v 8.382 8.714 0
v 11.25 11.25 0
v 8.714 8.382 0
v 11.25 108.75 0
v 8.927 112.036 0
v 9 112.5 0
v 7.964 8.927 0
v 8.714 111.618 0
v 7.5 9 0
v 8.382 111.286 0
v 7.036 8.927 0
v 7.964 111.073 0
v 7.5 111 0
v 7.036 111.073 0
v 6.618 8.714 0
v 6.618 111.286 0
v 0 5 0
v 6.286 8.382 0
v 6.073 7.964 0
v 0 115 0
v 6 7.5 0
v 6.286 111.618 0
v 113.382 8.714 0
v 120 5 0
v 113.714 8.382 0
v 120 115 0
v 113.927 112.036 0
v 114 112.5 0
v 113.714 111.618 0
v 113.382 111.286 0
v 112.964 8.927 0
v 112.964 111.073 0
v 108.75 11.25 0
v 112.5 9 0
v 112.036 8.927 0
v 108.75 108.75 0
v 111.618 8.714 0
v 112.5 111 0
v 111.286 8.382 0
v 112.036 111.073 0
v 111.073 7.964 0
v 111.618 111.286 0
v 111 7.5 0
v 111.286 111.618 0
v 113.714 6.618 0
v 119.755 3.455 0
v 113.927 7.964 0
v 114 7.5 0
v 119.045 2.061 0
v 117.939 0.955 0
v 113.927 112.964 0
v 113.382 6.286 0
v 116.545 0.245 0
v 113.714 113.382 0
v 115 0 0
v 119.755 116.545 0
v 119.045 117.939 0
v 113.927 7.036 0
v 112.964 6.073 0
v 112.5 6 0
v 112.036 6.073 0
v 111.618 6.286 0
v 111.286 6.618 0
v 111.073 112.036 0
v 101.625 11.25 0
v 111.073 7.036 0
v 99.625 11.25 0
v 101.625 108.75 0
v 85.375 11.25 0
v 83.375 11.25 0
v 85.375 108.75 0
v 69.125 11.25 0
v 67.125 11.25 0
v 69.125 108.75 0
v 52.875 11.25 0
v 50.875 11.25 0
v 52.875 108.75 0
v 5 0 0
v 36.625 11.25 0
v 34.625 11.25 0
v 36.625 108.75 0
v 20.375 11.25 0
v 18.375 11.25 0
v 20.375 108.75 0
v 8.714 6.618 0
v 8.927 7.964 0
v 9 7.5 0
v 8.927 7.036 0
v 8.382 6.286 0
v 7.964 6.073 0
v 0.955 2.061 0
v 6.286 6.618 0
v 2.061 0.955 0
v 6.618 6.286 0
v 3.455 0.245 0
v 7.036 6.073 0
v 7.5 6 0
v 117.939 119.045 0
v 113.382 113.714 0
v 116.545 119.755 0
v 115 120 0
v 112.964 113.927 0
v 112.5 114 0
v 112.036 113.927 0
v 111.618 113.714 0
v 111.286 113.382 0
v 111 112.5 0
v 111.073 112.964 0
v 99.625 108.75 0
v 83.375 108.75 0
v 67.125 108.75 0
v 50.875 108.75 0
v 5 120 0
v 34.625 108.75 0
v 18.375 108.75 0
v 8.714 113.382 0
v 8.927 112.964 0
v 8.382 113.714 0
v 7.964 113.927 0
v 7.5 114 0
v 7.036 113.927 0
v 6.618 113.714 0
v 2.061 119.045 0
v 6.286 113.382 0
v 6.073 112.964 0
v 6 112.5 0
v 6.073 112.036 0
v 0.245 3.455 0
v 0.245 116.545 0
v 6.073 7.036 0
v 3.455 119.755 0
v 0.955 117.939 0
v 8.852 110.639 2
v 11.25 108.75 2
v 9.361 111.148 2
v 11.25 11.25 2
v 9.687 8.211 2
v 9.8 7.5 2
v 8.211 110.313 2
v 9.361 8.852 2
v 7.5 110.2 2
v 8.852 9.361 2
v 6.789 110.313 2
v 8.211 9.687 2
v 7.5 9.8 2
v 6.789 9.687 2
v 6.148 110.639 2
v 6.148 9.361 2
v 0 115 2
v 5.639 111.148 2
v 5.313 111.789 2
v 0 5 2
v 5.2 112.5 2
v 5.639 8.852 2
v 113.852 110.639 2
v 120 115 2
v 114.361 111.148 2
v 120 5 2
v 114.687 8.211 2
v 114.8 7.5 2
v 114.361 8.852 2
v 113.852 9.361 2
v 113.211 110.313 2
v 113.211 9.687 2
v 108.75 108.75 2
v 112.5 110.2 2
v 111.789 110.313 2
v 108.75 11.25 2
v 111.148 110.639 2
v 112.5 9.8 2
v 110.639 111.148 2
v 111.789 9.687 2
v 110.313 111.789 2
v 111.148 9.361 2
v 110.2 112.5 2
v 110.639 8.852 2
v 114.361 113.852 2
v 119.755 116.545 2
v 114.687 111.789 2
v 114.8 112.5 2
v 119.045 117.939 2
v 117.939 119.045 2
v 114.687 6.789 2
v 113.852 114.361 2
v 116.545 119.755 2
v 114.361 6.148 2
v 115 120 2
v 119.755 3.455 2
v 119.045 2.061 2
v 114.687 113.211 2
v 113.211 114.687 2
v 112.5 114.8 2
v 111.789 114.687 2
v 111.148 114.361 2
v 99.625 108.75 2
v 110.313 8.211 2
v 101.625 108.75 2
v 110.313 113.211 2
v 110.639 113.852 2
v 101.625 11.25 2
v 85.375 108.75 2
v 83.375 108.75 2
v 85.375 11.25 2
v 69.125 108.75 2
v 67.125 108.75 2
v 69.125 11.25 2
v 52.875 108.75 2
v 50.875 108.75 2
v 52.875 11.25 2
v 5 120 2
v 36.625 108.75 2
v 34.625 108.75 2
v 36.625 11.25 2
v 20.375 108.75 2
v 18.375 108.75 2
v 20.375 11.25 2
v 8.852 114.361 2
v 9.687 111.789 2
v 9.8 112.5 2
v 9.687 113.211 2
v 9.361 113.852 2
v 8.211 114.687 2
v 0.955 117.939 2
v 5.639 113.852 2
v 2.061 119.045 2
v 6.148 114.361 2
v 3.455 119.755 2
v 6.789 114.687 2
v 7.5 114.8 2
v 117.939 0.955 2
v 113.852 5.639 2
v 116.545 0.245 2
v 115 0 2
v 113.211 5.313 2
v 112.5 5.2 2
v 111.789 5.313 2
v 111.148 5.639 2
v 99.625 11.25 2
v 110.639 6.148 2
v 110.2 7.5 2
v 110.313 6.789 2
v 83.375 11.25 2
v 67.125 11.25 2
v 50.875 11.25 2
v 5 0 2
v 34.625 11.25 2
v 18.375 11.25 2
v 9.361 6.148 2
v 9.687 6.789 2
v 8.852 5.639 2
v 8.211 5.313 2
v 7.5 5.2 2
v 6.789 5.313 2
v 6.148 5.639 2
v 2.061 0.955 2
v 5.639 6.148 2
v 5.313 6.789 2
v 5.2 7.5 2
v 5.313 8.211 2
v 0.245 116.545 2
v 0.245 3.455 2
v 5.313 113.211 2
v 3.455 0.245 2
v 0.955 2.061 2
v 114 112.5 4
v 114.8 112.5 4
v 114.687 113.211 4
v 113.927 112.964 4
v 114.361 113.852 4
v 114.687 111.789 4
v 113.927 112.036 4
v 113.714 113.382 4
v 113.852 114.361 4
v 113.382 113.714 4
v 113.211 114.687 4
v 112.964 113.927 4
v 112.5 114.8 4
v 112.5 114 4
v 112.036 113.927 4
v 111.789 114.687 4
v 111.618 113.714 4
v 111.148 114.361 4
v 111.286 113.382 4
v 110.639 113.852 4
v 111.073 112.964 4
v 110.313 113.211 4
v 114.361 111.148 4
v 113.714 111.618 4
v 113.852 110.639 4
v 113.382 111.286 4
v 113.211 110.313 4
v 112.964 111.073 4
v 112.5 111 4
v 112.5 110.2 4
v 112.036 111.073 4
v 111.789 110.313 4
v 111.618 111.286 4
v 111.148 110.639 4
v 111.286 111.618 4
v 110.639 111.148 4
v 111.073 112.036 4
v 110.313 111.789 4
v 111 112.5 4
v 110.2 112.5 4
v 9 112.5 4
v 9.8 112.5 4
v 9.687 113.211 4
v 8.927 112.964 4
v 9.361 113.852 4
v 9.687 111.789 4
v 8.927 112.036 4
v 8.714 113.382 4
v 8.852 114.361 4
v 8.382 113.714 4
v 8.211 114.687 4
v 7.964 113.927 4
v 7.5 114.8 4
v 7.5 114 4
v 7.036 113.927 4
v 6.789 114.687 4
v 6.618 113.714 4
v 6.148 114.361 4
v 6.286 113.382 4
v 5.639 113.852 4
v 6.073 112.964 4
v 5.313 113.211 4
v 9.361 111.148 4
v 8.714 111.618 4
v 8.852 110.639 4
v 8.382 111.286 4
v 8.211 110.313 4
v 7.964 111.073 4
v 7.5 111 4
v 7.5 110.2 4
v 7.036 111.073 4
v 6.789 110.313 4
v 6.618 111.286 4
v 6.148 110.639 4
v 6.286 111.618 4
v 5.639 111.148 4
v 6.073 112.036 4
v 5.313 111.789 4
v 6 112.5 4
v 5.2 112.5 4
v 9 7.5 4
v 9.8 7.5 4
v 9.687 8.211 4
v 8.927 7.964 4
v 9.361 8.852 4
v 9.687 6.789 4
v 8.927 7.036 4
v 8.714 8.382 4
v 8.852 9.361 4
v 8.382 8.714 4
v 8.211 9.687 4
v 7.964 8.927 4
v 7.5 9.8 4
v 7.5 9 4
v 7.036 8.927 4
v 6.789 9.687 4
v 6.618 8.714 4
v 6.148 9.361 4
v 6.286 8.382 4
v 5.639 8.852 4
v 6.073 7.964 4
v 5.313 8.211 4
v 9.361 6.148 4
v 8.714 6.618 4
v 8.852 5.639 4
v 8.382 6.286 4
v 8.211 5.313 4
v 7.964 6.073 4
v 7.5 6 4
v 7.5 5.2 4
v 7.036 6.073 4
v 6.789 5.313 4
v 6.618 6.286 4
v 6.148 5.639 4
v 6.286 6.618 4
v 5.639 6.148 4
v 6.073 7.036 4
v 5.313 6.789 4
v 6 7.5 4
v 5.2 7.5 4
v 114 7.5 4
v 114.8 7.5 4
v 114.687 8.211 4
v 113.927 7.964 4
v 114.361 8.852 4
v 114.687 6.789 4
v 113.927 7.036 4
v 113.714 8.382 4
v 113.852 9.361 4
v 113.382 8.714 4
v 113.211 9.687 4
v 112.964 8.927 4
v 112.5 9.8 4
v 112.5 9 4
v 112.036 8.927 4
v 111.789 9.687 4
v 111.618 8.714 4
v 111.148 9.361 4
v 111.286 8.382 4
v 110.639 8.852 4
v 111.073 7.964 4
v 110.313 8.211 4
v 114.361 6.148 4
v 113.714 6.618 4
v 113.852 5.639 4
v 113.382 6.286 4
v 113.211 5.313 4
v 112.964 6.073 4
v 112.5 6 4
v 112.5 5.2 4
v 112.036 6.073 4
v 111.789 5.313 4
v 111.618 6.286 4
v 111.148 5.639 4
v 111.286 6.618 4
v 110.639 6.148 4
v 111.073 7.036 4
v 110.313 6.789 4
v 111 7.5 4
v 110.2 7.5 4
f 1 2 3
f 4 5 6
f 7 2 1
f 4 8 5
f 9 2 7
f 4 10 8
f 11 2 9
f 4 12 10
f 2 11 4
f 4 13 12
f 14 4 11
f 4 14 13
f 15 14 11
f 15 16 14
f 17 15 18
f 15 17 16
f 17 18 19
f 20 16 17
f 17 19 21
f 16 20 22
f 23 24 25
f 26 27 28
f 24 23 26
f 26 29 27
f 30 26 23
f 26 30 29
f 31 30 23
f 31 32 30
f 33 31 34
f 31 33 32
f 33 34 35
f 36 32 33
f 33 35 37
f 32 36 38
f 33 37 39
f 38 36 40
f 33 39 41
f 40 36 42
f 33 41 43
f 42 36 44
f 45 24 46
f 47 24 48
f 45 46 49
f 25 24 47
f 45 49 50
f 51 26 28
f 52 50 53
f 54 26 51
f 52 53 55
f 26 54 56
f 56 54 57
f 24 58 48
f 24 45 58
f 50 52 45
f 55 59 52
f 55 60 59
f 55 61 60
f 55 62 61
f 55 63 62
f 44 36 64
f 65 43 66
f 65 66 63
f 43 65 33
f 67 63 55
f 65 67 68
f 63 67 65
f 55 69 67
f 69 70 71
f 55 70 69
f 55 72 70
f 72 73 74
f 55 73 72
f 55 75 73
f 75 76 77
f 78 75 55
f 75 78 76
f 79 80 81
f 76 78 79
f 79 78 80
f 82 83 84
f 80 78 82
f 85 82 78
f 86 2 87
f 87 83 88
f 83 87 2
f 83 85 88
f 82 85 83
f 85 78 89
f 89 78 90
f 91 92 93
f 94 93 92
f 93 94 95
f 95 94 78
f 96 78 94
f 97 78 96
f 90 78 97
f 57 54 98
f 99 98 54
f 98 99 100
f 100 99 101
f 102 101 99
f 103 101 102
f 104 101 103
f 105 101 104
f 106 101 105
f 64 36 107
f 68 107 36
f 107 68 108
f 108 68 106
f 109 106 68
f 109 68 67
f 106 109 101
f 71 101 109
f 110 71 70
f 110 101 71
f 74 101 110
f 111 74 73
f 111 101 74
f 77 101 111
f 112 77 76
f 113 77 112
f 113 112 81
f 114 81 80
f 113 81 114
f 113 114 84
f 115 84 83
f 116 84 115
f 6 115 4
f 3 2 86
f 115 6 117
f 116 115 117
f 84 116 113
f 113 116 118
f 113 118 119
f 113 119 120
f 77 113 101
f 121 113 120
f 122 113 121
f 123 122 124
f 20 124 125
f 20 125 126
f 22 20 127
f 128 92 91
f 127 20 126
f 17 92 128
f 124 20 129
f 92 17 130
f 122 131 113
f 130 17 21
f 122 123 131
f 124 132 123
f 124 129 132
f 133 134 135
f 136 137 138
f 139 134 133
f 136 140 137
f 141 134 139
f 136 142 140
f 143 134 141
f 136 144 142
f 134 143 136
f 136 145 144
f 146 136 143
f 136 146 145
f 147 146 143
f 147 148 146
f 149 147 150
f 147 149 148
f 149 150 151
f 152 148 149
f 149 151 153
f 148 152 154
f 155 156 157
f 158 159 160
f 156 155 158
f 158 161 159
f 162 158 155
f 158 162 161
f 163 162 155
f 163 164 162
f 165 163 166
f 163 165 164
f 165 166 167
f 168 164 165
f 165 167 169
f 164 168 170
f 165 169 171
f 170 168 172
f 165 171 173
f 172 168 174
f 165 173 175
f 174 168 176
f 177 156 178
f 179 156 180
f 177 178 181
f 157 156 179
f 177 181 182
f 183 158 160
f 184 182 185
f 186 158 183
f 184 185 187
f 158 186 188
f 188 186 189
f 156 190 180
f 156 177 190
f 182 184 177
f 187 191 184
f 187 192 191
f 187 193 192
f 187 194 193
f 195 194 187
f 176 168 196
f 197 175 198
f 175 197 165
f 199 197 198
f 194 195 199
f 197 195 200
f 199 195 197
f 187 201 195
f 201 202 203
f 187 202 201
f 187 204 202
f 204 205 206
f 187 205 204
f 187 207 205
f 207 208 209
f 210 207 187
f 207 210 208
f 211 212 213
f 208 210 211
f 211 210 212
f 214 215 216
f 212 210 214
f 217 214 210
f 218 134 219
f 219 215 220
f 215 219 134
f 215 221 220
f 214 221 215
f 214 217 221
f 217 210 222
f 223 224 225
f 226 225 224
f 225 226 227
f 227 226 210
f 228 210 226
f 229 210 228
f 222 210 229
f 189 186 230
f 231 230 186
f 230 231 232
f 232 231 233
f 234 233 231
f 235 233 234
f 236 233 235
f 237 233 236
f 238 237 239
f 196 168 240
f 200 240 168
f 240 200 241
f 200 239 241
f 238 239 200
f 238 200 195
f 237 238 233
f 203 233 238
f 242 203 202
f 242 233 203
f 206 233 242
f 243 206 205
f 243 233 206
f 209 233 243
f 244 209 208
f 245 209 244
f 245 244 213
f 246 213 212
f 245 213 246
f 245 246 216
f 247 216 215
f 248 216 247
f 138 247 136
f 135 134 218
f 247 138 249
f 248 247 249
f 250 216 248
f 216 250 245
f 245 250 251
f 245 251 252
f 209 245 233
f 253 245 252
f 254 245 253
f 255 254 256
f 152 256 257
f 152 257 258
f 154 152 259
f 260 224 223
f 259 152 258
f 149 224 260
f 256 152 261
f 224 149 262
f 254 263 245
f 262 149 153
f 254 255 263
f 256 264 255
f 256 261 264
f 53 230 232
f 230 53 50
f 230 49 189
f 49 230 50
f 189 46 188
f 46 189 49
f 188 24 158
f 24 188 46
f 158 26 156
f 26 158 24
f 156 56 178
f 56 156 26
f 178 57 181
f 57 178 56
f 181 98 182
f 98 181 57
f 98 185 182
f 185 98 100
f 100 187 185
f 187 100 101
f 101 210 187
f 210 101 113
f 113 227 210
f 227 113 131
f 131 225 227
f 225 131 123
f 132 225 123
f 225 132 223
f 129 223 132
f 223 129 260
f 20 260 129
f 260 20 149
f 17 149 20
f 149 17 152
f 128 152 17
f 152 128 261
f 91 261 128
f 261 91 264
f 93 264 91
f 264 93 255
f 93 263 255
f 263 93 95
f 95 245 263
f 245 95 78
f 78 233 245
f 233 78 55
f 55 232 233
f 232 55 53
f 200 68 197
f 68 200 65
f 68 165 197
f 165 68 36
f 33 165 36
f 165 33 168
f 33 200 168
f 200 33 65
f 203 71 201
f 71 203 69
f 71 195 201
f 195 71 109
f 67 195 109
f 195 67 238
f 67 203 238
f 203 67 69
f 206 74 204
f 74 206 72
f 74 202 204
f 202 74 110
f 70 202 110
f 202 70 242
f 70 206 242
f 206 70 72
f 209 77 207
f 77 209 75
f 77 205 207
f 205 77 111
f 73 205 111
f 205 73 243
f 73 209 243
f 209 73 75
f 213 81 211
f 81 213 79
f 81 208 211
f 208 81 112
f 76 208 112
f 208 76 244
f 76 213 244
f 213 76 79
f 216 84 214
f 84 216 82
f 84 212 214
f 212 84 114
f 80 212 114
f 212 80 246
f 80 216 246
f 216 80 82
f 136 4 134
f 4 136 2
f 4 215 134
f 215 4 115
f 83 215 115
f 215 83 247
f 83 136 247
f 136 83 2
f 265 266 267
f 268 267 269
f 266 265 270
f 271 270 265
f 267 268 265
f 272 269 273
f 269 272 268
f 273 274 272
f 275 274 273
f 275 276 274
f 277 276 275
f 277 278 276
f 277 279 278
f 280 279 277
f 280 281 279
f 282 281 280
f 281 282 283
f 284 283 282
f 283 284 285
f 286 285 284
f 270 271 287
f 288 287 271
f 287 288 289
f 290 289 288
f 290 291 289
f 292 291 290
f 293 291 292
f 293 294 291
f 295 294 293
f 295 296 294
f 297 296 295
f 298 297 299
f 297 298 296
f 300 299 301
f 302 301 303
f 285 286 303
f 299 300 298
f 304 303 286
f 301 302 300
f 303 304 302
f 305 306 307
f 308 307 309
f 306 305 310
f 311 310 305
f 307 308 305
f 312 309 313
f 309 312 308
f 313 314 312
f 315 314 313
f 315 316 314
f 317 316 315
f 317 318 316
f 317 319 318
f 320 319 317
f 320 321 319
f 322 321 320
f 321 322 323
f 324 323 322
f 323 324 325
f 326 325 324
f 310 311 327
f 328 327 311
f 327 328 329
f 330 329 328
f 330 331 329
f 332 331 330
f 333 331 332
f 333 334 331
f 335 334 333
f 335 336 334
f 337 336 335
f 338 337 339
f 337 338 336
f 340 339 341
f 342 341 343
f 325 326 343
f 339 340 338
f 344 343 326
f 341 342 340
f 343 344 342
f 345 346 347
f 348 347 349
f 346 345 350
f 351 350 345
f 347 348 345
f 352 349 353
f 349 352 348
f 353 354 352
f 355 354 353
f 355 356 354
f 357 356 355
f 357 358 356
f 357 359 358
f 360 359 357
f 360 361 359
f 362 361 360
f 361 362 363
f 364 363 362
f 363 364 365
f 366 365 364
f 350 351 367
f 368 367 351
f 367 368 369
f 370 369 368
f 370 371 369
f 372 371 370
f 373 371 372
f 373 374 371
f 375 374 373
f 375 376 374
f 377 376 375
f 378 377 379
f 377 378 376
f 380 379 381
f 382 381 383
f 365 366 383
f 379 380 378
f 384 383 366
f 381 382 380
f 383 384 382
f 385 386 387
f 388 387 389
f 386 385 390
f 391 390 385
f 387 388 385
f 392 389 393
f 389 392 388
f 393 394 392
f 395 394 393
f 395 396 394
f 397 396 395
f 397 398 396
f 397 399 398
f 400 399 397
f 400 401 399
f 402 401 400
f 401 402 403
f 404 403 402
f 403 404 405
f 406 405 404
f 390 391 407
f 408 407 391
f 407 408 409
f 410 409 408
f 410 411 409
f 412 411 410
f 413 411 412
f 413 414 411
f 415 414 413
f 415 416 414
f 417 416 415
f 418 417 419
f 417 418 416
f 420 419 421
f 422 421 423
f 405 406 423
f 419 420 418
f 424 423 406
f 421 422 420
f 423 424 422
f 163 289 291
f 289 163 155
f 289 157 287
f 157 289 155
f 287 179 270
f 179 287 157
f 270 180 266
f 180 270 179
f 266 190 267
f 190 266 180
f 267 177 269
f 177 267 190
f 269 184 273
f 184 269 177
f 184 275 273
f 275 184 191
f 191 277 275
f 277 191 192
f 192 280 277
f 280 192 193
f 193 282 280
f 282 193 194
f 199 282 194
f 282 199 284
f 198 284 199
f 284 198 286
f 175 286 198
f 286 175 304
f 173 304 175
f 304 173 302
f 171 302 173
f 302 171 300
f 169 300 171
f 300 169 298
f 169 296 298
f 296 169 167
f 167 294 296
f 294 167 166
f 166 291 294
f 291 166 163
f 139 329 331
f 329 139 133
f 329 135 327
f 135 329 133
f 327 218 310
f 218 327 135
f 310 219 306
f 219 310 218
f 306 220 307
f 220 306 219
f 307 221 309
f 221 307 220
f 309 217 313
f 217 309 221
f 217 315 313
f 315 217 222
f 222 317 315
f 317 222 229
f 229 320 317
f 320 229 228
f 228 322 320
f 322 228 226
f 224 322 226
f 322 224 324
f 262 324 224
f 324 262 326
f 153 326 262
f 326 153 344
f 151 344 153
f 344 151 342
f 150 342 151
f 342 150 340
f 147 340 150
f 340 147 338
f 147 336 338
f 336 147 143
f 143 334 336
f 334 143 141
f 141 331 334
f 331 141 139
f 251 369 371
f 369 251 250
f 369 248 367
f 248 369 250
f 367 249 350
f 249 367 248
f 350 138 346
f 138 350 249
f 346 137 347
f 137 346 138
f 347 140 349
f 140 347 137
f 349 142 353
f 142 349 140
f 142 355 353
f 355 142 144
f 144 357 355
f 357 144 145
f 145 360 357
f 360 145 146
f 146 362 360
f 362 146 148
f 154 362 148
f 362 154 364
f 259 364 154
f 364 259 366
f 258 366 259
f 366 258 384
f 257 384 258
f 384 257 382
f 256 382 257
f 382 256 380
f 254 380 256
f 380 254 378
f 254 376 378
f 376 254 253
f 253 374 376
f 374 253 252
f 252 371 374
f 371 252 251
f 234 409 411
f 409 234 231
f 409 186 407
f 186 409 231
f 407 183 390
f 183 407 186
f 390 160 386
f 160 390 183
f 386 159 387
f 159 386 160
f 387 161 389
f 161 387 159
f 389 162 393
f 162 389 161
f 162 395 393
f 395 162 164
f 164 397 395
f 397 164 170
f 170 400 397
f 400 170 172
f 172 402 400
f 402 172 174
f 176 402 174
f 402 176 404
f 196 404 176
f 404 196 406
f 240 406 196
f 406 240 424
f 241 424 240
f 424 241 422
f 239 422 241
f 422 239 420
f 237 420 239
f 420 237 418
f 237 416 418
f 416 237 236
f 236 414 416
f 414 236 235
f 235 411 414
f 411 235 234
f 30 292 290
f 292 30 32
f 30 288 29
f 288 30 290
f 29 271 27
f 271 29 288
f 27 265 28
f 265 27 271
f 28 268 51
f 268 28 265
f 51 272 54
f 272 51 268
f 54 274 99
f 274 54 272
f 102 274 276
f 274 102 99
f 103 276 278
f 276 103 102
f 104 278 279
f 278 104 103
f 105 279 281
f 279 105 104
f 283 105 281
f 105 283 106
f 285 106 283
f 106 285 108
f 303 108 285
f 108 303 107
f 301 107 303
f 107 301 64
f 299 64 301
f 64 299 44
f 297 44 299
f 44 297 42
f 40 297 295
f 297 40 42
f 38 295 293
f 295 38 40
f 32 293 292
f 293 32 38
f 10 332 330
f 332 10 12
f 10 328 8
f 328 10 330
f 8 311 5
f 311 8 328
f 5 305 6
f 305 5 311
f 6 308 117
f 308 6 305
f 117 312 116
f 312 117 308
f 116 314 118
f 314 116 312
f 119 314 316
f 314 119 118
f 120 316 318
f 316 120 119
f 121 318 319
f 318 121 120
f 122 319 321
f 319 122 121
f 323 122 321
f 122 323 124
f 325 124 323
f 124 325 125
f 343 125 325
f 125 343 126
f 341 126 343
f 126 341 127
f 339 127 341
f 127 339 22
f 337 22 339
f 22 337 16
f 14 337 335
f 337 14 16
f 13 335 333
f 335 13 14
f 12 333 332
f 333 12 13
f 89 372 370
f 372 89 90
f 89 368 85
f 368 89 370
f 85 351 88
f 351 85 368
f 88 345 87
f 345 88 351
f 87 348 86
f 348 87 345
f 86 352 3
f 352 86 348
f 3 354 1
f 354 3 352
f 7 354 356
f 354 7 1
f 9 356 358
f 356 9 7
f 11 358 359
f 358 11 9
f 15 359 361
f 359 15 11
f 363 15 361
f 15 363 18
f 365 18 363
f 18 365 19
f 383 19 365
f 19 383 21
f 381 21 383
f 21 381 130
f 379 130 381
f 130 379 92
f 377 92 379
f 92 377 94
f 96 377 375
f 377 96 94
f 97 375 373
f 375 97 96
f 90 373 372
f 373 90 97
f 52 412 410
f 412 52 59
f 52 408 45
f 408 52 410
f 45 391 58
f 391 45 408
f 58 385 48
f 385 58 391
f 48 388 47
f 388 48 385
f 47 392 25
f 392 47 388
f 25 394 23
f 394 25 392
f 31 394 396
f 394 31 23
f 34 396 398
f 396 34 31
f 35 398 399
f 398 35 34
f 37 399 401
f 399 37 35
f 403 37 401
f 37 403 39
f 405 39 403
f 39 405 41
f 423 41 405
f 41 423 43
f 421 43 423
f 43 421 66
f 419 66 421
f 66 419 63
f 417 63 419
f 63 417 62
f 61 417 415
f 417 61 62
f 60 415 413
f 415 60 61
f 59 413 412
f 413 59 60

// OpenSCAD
// file: ../lib/utils.scad
include <params.scad>;

function tol(val) = val - tolerance;

module cone(r, angle, invert=false) {
    h = tan((180 - angle) / 2) * r;
    translate([0, 0, -h]) {
        if (invert) {
                cylinder(r1=r,r2=0,h=h, $fn=20); 
        } else {
            cylinder(r1=0,r2=r,h=h, $fn=20); 
        }
    }
}

module roundrect(vect, r, $fn=20) {
    sq = len(vect) > 1
        ? [for (i = [0:1:len(vect)-1]) vect[i] - r * 2]
        : vect - r * 2;
    minkowski() {
        square(sq);
        translate([r, r])
            circle(r=r);
    }
}

module profile($fn=20) {
    minkowski() {
        translate([fan_case_radius, fan_case_radius, 0])
            square(fan_case - fan_case_radius * 2);
        circle(fan_case_radius, $fn);
    }
}

module fan_mount_points(radius, $fn=20) {
    offset = (fan_case - fan_screw_distance) / 2;
    translate([offset, offset, 0]) {
        circle(radius, $fn);
        translate([fan_screw_distance, 0, 0])
            circle(radius, $fn);
        translate([fan_screw_distance, fan_screw_distance, 0])
            circle(radius, $fn);
        translate([0, fan_screw_distance, 0])
            circle(radius, $fn);
    }
}

module square_grill(width, height, fin_width, fin_count) {
    fin_spacing = width / fin_count;
    difference() {
        square(width);
        union() {
            for (i = [0:1:fin_count]) {
                translate([(i + 1) * fin_spacing - (fin_spacing / 2) - (fin_width / 2), 0, 0])
                    square([fin_width, height]);
            }
        }
    }
}

module bushing(outer_r, inner_r, h) {
    linear_extrude(h)
        difference() {
            circle(r=outer_r);
            circle(r=inner_r);
        }
}

module screw_at_origin(r, d, l, head, head_d, cap, angle) {
    translate([0, 0, -l])
        screw(r, d, l, head, head_d, cap, angle);
}

module screw(r, d, l, head, head_d, cap, angle, fn=20, head_fn) {
    radius = r > 0 ? r : d / 2;
    head_r = head > 0 ? head : head_d / 2;
    hfn = head_fn ? head_fn : fn;

    union() {
        if (angle) {
            translate([0, 0, l])
                cone(head_r, angle, false);
        }
        linear_extrude(l)
            circle(r=radius, $fn=fn);
        if (cap > 0) {
            translate([0, 0, l - cap])
                linear_extrude(cap)
                    circle(r=head_r, $fn=hfn);
        }
    }
}

module inset_screw(r, d, l, head, head_d, cap, angle, inset, fn=20, head_fn) {
    screw_height = l - inset;
    head_r = head > 0 ? head : head_d / 2;

    union() {
        screw(
            r=r,
            d=d,
            l=screw_height,
            head=head_r,
            cap=cap,
            angle=angle,
            fn=fn,
            head_fn=head_fn
        );
        translate([0, 0, screw_height])
            linear_extrude(inset)
                circle(r=head_r, $fn=fn);
    }
}

function inch_to_mm(inches) = inches * 25.4;
// file: ../lib/params.scad
fan_case = 120;
fan_screw_distance = 105;
fan_case_depth = 25;
fan_case_radius = 5;
fan_case_screw_radius = 2.5;
fan_case_socket_cap_radius = 5.6 / 2;
fan_case_screw_head_radius = 3;
fan_case_screw_head_angle = 90;

grill_screw_size = 3;
grill_screw_radius = grill_screw_size / 2;
grill_screw_inset = 2;
grill_radius = 114 / 2;
grill_fin_offset = 10;
grill_fin_thickness = 2;
grill_fin_degrees = 30;

rear_grill_thickness = 2;

front_grill_thickness = 2;
front_grill_fin_count = 6;
front_grill_fin_thickness = 2;

filter_thickness = 5;
filter_width = fan_screw_distance - fan_case_screw_radius * 3;
filter_offset = (fan_case - filter_width) / 2;

base_retainer_thickness = 2;
base_height = 30;
base_cut_offset = 10;
base_retainer_inset = 4;

adapter_thickness = 2;
adapter_duct_in = 4;
adapter_height = 14;
adapter_duct_height = 50;
flat_adapter_duct_height = 50;
flat_adapter_screw_radius = 2;
flat_adapter_screw_head_radius = 4;

caddy_thickness = 2;
caddy_handle_width = 20;
caddy_handle_depth = 10;
caddy_handle_grip_count = 5;
caddy_handle_grip_depth = 1;
caddy_handle_grip_width = 1;
caddy_clip_height = 2;
caddy_clip_depth = 6;
caddy_clip_offset = 1;

foot_lower_radius = 15;
foot_upper_radius = 20;
foot_height = 18;
foot_inset_radius = 4;
foot_inset_depth = 3;
foot_screw_radius = 4;
foot_screw_inset = 6;
foot_screw_head_radius = 8;

power_supply_case_thickness = 3.0;
power_supply_screw_radius = 1.5;
power_supply_bushing_radius = 7.5;

power_supply_cable_pass_width = 18;
power_supply_cable_pass_height = 5;
power_supply_cable_pass_overhang = 5;
power_supply_cable_pass_overhang_depth = power_supply_case_thickness;
power_supply_cable_pass_depth = 3;
power_supply_cable_pass_thickness = 3;

tolerance = 0.2;
// main file
include <../lib/params.scad>;
use <../lib/utils.scad>;

difference() {
    union() {
        linear_extrude(height=front_grill_thickness)
            difference() {
                profile();
                translate([filter_offset, filter_offset])
                    square_grill(filter_width, filter_width, front_grill_fin_thickness, front_grill_fin_count);
            }
        translate([0, 0, front_grill_thickness])
            linear_extrude(height=grill_screw_inset)
                fan_mount_points(tol(fan_case_screw_radius));
    }
    linear_extrude(height=front_grill_thickness + grill_screw_inset)
        fan_mount_points(grill_screw_size/2);
}
